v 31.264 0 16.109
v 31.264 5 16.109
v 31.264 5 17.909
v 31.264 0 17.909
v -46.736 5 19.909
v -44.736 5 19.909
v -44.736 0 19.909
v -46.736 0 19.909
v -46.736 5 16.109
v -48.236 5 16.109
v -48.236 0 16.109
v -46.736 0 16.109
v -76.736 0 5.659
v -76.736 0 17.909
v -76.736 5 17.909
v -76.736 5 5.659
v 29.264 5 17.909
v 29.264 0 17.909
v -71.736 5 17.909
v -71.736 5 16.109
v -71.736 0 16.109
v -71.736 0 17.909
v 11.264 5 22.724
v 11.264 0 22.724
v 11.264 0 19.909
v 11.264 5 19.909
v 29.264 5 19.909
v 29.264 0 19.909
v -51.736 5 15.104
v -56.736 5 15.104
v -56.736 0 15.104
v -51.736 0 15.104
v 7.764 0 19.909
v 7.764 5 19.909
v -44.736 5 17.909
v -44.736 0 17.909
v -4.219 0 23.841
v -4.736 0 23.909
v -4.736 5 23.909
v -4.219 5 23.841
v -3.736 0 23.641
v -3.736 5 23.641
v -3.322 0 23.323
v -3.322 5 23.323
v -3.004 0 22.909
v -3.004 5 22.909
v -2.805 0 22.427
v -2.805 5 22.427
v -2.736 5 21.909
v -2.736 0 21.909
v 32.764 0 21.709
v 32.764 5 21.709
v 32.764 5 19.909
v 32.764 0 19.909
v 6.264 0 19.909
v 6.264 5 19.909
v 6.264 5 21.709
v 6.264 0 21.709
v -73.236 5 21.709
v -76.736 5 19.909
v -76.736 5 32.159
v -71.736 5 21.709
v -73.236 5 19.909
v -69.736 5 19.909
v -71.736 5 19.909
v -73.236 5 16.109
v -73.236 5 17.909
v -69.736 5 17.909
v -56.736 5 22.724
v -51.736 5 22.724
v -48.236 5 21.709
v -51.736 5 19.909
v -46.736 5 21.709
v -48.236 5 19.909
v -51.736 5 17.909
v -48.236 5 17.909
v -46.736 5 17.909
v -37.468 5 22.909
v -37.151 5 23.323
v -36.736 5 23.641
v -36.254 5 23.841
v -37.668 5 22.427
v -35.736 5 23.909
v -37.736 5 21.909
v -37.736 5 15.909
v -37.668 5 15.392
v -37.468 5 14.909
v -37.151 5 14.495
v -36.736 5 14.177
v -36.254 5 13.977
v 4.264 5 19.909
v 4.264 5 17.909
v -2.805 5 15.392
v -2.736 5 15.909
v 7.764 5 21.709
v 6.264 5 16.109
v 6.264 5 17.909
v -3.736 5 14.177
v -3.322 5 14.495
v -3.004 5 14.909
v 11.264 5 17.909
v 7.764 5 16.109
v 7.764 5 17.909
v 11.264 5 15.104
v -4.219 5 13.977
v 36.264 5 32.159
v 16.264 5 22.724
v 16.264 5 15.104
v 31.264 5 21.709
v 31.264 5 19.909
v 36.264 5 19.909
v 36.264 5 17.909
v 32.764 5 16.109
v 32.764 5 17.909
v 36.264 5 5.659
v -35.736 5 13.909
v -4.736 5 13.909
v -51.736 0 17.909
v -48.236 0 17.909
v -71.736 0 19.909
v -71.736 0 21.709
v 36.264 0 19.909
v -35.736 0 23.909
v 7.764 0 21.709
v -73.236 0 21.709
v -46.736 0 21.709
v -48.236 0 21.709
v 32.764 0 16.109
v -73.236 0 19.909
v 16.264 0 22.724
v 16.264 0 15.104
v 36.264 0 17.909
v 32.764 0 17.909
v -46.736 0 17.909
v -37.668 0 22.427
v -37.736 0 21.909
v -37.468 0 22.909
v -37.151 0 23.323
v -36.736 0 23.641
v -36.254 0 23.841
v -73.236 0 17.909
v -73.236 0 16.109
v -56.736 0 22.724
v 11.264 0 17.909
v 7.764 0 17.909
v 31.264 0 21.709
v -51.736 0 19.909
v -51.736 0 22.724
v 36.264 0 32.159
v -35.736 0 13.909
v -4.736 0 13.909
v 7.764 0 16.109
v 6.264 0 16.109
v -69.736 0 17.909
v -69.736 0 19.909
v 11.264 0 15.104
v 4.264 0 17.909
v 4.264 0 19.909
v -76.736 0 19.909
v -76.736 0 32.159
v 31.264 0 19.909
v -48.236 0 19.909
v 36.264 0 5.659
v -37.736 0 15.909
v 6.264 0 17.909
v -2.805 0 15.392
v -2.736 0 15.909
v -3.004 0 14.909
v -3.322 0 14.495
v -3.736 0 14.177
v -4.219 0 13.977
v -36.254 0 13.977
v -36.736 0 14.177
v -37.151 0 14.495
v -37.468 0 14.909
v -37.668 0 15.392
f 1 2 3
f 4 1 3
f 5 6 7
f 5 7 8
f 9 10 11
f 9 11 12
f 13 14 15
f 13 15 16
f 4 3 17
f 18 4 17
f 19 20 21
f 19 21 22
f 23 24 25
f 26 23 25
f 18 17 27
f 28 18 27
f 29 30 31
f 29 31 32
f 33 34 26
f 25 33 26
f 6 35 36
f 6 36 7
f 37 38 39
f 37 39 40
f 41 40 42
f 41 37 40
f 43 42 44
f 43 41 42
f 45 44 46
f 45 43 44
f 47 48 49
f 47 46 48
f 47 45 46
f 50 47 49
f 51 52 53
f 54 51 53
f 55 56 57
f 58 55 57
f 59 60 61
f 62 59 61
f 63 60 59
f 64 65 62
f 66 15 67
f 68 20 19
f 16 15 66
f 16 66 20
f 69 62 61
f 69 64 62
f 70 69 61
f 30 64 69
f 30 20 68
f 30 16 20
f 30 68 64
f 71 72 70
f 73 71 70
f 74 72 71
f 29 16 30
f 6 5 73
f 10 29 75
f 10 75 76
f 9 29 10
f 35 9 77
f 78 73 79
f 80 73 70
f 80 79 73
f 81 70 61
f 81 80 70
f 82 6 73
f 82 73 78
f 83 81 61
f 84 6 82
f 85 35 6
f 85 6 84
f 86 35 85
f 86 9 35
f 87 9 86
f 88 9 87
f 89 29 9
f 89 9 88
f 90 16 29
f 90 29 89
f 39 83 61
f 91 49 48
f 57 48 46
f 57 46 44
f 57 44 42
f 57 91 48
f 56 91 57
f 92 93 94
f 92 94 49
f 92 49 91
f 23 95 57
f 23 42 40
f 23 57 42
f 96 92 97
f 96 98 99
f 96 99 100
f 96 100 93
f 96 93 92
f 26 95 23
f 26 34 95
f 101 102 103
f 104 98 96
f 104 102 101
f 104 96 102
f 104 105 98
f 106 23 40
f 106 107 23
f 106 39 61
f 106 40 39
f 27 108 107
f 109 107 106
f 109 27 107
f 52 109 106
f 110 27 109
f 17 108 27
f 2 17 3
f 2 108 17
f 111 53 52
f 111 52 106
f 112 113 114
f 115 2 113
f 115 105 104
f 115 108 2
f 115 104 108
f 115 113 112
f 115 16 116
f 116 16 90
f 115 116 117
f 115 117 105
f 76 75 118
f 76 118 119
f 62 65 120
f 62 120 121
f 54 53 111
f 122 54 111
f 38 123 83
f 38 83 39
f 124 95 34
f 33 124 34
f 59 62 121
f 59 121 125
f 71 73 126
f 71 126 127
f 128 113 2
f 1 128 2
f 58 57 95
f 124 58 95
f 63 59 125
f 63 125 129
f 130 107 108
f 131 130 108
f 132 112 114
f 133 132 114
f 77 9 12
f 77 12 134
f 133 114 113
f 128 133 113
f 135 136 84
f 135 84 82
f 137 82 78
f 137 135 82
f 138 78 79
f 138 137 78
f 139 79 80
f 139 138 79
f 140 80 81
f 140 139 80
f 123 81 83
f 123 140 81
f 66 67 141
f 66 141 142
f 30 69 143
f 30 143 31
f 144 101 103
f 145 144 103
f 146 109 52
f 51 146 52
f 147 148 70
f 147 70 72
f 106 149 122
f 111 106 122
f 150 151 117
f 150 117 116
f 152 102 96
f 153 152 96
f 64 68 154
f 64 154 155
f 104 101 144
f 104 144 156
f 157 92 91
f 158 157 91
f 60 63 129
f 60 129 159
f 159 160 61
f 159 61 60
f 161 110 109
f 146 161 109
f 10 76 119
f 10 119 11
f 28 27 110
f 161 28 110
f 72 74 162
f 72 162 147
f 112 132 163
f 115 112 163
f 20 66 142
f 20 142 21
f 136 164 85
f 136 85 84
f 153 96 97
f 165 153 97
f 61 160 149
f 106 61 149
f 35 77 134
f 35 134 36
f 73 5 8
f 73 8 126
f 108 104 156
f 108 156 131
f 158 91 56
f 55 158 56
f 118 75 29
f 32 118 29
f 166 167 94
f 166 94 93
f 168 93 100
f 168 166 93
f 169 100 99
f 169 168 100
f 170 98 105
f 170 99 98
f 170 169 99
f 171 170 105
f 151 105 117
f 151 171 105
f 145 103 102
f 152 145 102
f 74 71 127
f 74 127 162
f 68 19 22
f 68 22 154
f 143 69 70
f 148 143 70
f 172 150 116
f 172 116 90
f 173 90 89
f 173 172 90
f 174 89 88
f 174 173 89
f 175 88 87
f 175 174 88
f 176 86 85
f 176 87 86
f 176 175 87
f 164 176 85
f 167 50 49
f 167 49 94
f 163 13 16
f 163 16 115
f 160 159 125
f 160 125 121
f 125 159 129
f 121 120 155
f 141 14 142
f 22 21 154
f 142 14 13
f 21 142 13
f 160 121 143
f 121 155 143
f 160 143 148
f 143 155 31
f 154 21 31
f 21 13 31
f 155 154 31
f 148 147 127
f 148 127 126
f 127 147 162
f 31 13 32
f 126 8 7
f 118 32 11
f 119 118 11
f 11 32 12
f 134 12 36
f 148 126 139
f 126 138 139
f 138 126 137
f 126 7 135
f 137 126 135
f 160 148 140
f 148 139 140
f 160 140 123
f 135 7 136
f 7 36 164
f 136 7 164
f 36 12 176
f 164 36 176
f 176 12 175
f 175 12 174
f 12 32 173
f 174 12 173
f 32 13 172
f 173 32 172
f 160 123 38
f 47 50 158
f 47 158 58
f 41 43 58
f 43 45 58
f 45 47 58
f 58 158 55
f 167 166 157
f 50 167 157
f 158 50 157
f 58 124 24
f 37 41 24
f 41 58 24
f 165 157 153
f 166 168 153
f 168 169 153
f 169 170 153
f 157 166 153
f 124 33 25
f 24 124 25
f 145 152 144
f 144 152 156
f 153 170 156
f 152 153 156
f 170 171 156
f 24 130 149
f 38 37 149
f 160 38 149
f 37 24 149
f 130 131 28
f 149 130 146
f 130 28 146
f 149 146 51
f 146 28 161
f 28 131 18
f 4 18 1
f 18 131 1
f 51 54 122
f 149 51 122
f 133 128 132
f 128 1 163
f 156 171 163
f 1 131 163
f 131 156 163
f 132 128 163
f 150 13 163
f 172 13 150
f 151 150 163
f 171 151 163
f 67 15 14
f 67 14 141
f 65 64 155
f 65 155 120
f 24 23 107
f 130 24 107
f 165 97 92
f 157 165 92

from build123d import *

# Parameters (mm, degrees)
ESBO_O1_W                = 113
ESBO_O1_H                = 26.5
RESSALTO_EXTRUS_O1_DEPTH = 5
ESBO_O2_W                = 5
ESBO_O2_H                = 7.62
CORTE_EXTRUS_O1_DEPTH    = 5
CORTE_EXTRUS_O2_DEPTH    = 5
CORTE_EXTRUS_O3_DEPTH    = 10


with BuildPart() as part:
    # Esboço1 → Ressalto-extrusão1 (new body)
    with BuildSketch(Plane(origin=(0, 0, 0), x_dir=(1, 0, 0), z_dir=(0, 1, 0))):
        with Locations((-20.23644711, -18.909257917)):
            Rectangle(ESBO_O1_W, ESBO_O1_H)
    extrude(amount=RESSALTO_EXTRUS_O1_DEPTH)

    # Esboço2 → Corte-extrusão1 (cut)
    with BuildSketch(Plane(origin=(0, 5, 0), x_dir=(1, 0, 0), z_dir=(0, 1, 0))):
        with Locations((13.76355289, -18.914257917)):
            Rectangle(ESBO_O2_W, ESBO_O2_H)
        with Locations((-54.23644711, -18.914257917)):
            Rectangle(ESBO_O2_W, ESBO_O2_H)
    extrude(amount=-CORTE_EXTRUS_O1_DEPTH, mode=Mode.SUBTRACT)

    # Esboço3 → Corte-extrusão2 (cut)
    with BuildSketch(Plane(origin=(0, 5, 0), x_dir=(1, 0, 0), z_dir=(0, 1, 0))):
        Polygon((-76.73644711, -17.909257917), (-73.23644711, -17.909257917), (-73.23644711, -16.109257917), (-71.73644711, -16.109257917), (-71.73644711, -17.909257917), (-69.73644711, -17.909257917), (-69.73644711, -19.909257917), (-71.73644711, -19.909257917), (-71.73644711, -21.709257917), (-73.23644711, -21.709257917), (-73.23644711, -19.909257917), (-76.73644711, -19.909257917), align=None)
        Polygon((-51.73644711, -17.909257917), (-48.23644711, -17.909257917), (-48.23644711, -16.109257917), (-46.73644711, -16.109257917), (-46.73644711, -17.909257917), (-44.73644711, -17.909257917), (-44.73644711, -19.909257917), (-46.73644711, -19.909257917), (-46.73644711, -21.709257917), (-48.23644711, -21.709257917), (-48.23644711, -19.909257917), (-51.73644711, -19.909257917), align=None)
    corte_extrus_o2 = extrude(amount=-CORTE_EXTRUS_O2_DEPTH, mode=Mode.SUBTRACT)

    # Espelhar1: Corte-extrusão2 across plane
    add(corte_extrus_o2.mirror(Plane.ZY.offset(20.23644711)), mode=Mode.SUBTRACT)

    # Esboço4 → Corte-extrusão3 (cut)
    with BuildSketch(Plane.XZ):
        with BuildLine():
            Line((-4.73644711, 13.909257917), (-35.73644711, 13.909257917))
            ThreePointArc((-35.73644711, 13.909257917), (-37.150660672, 14.495044355), (-37.73644711, 15.909257917))
            Line((-37.73644711, 15.909257917), (-37.73644711, 21.909257917))
            ThreePointArc((-37.73644711, 21.909257917), (-37.150660672, 23.32347148), (-35.73644711, 23.909257917))
            Line((-35.73644711, 23.909257917), (-4.73644711, 23.909257917))
            ThreePointArc((-4.73644711, 23.909257917), (-3.322233548, 23.32347148), (-2.73644711, 21.909257917))
            Line((-2.73644711, 21.909257917), (-2.73644711, 15.909257917))
            ThreePointArc((-2.73644711, 15.909257917), (-3.322233548, 14.495044355), (-4.73644711, 13.909257917))
        make_face()
    extrude(amount=-CORTE_EXTRUS_O3_DEPTH, mode=Mode.SUBTRACT)


solid = part.part
